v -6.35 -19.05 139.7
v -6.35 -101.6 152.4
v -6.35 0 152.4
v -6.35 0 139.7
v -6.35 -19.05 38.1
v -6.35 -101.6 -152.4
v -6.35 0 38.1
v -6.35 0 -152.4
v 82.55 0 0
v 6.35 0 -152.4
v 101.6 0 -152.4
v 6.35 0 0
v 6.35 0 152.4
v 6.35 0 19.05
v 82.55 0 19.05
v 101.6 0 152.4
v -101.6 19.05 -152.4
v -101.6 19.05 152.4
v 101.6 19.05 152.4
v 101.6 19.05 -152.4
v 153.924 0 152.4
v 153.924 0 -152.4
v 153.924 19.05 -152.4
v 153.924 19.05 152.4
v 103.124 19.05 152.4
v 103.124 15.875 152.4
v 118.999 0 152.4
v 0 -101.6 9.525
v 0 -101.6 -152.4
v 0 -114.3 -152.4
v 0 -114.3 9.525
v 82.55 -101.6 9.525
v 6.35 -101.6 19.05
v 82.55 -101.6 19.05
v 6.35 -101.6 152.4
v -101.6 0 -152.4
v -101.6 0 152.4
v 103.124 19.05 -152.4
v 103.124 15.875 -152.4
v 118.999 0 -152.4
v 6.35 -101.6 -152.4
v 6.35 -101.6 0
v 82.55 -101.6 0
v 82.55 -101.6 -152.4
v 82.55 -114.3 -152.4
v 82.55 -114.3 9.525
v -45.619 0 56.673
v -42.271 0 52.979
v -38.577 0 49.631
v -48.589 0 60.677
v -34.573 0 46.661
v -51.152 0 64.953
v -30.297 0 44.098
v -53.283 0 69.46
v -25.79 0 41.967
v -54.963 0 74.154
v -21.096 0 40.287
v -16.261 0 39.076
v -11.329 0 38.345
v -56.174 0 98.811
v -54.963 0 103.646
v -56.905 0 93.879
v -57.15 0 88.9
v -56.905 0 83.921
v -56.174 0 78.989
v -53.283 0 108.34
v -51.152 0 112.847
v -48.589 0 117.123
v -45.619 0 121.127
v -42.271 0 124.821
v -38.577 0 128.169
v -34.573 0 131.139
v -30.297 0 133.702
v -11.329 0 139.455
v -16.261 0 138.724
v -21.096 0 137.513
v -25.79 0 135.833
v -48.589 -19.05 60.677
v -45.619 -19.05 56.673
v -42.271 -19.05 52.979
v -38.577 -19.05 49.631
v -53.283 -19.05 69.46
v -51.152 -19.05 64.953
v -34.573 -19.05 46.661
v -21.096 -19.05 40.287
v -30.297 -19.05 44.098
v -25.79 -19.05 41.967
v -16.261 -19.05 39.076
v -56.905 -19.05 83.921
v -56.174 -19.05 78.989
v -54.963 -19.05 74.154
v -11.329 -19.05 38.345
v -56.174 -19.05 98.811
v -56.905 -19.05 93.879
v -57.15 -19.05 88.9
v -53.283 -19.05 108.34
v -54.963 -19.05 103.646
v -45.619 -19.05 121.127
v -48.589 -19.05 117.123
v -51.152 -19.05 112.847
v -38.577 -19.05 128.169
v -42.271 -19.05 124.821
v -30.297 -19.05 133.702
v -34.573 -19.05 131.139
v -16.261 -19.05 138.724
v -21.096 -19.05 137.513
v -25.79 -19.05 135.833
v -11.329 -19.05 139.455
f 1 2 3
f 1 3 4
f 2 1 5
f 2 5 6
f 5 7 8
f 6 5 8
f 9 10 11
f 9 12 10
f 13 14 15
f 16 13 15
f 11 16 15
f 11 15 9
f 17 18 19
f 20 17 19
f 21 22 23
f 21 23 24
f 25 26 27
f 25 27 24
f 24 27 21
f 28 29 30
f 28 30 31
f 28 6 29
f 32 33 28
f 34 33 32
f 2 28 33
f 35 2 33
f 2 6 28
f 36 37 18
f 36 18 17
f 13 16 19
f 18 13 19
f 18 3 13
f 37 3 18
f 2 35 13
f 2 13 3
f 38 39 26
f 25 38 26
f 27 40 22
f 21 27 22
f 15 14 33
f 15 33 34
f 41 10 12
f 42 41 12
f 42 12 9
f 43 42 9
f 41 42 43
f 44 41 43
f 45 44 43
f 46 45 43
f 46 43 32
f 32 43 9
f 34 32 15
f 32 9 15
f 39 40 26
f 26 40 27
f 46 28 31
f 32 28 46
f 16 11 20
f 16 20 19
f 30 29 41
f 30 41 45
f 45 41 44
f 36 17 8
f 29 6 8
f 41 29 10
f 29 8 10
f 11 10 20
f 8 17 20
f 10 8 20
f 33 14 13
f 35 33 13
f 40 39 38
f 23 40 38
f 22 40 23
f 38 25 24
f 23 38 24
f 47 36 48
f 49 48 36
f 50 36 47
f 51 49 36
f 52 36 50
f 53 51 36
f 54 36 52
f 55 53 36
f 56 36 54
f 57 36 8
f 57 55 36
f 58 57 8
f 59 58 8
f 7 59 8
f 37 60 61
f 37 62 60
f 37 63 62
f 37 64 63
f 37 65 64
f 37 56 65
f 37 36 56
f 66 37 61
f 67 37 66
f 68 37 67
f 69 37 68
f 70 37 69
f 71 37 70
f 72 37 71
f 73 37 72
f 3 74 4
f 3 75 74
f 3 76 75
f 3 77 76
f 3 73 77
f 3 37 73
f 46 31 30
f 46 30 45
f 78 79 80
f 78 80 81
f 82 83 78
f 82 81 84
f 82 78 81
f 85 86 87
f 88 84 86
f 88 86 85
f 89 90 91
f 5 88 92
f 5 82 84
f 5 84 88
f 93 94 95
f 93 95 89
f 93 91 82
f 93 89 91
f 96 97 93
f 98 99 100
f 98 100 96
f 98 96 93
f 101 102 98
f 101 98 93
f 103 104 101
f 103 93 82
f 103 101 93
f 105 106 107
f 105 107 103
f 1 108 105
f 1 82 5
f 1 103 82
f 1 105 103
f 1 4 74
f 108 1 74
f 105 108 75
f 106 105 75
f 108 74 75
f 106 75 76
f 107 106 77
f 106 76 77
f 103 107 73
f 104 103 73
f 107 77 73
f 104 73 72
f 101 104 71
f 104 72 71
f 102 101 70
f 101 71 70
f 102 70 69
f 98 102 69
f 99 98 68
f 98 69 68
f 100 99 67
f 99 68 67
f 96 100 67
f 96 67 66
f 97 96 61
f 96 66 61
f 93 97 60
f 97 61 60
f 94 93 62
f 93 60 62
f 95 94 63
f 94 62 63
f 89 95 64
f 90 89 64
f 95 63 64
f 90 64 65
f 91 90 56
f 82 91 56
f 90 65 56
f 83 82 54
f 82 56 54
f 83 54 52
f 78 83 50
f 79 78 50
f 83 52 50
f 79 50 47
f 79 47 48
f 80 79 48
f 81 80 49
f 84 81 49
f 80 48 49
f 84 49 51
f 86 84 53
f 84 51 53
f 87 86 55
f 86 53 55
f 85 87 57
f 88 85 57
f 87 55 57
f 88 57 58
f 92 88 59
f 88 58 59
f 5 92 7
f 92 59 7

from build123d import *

# Parameters (mm, degrees)
F0_W     = 50.8
F0_H     = 304.8
F1_DEPTH = 19.05
F2_SIZE  = 15.875
F3_W     = 76.2
F3_H     = 19.05
F4_DEPTH = 101.6
F6_DEPTH = 19.05
F7_W     = 82.55
F7_H     = 161.925
F8_DEPTH = 12.7


with BuildPart() as f1:
    # F0 (on Front) → F1 (new body)
    with BuildSketch(Plane.XZ):
        with Locations((128.524, 0)):
            Rectangle(F0_W, F0_H)
    extrude(amount=-F1_DEPTH)

    # F2
    f2_edges = [f1.edges().sort_by_distance(p)[0] for p in [
        (103.124, 0, 0),
    ]]
    chamfer(f2_edges, length=F2_SIZE)


with BuildPart() as f1b:
    # F0 (on Front) → F1, piece 2 (new body)
    with BuildSketch(Plane.XZ):
        Polygon((6.35, -152.4), (101.6, -152.4), (101.6, 152.4), (-101.6, 152.4), (-101.6, -152.4), (-6.35, -152.4), align=None)
    extrude(amount=-F1_DEPTH)

    # F3 (on face) → F4 (join)
    with BuildSketch(Plane.XZ):
        Polygon((6.35, 152.4), (-6.35, 152.4), (-6.35, -152.4), (6.35, -152.4), (6.35, 0), (6.35, 19.05), align=None)
        with Locations((44.45, 9.525)):
            Rectangle(F3_W, F3_H)
    extrude(amount=F4_DEPTH)

    # F5 (on face) → F6 (join)
    with BuildSketch(Plane.XZ):
        with BuildLine():
            Line((-6.35, 38.1), (-6.35, 139.7))
            ThreePointArc((-6.35, 139.7), (-57.15, 88.9), (-6.35, 38.1))
        make_face()
    extrude(amount=F6_DEPTH)

    # F7 (on face) → F8 (join)
    with BuildSketch(Plane.XZ.offset(101.6)):
        with Locations((41.275, -71.4375)):
            Rectangle(F7_W, F7_H)
    extrude(amount=F8_DEPTH)


solid = Compound([f1.part, f1b.part])
